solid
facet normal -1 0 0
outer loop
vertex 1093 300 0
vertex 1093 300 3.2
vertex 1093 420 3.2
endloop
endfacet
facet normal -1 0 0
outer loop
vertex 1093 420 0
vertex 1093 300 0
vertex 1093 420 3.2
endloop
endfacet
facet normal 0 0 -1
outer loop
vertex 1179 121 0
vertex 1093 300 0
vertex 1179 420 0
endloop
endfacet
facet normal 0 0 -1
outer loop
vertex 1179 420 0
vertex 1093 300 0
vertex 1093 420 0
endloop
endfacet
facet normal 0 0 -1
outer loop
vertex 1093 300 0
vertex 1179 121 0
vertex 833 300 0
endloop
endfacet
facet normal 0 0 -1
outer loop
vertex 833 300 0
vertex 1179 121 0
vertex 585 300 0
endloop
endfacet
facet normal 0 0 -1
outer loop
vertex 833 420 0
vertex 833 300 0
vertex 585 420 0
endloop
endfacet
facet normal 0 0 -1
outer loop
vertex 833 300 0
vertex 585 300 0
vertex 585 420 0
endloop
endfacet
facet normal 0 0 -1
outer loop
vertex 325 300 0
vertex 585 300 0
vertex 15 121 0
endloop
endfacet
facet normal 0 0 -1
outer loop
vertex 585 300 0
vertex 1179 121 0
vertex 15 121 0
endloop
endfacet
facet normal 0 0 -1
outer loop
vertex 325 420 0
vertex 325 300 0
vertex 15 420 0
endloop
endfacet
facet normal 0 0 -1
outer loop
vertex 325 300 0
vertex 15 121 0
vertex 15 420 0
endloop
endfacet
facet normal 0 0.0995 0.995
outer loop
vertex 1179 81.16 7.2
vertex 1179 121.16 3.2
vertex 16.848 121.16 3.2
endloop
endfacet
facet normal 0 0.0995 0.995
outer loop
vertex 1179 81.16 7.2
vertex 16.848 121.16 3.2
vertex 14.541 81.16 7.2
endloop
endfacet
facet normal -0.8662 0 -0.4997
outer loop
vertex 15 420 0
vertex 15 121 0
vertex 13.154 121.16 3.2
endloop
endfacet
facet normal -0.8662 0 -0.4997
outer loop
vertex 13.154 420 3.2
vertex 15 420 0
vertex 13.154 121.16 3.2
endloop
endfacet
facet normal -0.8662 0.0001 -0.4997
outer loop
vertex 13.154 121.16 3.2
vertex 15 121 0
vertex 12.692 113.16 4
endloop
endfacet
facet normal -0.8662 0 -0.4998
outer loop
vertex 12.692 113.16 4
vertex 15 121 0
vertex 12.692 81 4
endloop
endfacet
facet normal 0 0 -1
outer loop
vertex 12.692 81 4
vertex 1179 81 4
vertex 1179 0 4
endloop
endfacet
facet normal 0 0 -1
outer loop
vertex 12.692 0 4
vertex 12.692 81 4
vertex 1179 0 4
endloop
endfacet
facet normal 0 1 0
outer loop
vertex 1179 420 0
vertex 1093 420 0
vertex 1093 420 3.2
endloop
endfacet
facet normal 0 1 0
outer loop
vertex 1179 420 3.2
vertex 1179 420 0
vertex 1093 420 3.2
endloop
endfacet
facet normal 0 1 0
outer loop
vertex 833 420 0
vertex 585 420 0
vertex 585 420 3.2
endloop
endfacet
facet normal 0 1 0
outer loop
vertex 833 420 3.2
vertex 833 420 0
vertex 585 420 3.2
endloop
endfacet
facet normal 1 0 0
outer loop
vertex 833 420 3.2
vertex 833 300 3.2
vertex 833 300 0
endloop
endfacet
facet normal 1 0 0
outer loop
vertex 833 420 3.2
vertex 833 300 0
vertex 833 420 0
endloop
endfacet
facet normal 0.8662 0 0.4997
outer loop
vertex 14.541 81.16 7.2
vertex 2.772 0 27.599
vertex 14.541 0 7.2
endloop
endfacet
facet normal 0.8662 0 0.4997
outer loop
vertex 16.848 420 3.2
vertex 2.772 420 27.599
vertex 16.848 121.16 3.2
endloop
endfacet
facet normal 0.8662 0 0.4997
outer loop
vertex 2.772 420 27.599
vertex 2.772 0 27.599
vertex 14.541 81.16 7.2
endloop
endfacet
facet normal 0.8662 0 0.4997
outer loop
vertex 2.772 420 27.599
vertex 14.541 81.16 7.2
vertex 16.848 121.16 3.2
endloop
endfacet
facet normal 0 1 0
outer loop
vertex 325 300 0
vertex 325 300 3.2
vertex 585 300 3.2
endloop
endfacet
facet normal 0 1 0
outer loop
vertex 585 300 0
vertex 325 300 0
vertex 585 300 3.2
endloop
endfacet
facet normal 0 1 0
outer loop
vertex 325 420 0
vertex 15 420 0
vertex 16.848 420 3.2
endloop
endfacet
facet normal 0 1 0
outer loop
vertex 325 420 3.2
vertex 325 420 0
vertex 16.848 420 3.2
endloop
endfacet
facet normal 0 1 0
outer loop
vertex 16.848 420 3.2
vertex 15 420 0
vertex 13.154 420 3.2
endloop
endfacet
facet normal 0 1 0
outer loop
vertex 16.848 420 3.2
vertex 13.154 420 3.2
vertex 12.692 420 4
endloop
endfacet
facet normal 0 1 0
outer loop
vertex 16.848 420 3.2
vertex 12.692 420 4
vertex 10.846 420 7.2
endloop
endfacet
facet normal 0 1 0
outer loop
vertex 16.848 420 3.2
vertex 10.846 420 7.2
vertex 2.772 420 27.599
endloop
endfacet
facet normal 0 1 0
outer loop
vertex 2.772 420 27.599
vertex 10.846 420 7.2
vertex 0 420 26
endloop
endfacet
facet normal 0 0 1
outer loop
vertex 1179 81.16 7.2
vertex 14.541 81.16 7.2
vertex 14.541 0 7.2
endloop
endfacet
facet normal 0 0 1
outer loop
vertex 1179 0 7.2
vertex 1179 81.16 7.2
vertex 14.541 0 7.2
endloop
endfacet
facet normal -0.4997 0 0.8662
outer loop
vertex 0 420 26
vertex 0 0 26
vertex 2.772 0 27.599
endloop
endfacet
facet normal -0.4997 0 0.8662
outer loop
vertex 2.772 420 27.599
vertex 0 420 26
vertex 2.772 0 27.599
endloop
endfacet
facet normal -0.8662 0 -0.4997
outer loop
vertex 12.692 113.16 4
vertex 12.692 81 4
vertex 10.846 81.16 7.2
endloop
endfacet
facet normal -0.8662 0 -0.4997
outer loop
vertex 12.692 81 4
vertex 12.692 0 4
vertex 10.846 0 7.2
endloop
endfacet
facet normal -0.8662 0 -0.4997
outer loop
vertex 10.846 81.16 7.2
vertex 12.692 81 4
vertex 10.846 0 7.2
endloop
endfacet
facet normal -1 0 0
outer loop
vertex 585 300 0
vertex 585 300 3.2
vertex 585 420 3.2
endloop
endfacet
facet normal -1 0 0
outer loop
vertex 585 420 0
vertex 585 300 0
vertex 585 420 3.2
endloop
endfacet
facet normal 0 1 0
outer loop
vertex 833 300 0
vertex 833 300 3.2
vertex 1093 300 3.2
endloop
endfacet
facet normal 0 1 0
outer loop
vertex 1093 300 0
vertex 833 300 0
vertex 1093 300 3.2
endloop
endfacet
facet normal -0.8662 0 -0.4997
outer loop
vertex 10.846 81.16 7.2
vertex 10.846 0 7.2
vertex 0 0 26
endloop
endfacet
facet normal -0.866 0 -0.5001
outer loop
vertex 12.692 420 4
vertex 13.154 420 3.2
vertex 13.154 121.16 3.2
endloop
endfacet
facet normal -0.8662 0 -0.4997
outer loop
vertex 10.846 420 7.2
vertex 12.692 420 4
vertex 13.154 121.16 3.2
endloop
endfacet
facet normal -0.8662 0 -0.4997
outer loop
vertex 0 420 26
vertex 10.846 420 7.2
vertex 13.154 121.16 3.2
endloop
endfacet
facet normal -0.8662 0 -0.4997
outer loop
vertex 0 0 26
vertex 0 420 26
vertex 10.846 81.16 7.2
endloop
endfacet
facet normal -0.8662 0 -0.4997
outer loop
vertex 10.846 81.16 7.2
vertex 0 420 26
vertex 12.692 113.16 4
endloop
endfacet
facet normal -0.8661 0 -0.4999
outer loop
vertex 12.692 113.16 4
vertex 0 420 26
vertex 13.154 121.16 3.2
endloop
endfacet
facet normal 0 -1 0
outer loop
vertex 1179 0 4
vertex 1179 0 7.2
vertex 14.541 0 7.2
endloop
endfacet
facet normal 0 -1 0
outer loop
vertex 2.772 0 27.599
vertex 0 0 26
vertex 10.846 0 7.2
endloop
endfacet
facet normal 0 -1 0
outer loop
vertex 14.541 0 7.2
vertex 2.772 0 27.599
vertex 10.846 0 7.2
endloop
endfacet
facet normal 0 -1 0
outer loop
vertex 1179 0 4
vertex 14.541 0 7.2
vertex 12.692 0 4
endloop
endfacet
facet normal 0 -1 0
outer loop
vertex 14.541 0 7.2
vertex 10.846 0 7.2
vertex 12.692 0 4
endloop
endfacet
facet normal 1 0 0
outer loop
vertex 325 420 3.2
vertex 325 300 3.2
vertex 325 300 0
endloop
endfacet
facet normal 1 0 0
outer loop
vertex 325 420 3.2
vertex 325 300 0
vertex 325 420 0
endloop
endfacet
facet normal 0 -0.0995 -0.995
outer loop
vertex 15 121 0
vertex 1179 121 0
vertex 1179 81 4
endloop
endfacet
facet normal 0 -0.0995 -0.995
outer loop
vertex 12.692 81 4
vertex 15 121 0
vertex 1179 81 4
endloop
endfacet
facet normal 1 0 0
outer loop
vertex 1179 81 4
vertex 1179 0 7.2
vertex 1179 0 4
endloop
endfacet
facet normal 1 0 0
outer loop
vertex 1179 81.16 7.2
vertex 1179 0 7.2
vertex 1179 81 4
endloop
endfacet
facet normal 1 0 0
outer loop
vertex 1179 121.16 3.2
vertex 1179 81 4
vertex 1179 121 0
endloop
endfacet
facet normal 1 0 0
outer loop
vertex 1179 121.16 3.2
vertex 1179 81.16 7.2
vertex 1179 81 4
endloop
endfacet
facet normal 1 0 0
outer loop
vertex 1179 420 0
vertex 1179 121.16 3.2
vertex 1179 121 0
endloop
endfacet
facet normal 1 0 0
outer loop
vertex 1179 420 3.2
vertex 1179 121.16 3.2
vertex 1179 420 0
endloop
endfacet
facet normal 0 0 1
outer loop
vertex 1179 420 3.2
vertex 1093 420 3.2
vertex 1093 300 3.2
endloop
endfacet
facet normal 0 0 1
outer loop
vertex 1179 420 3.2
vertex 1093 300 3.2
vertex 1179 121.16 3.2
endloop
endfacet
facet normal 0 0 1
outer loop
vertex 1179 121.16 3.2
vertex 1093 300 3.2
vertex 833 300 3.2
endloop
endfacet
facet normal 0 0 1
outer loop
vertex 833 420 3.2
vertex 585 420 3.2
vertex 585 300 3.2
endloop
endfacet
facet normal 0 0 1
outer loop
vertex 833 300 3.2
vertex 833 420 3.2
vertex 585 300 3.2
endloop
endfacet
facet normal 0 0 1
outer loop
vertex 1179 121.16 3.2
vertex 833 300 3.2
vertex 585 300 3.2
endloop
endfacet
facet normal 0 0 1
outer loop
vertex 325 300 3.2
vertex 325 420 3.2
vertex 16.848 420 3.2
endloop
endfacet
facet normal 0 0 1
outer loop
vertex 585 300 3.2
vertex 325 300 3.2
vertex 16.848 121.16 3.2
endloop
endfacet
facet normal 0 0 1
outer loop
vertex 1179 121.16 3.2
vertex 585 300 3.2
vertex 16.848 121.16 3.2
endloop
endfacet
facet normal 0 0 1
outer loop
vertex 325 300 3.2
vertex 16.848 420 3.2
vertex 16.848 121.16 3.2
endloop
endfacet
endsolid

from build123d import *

# Parameters (mm, degrees)
F1_DEPTH = 1179
F2_W     = 260
F2_H     = 120
F3_DEPTH = 25
F5_DEPTH = 420
F7_DEPTH = 420
F9_DEPTH = 1200


with BuildPart() as f1:
    # F0 (on Right) → F1 (new body)
    with BuildSketch(Plane.YZ):
        Polygon((81, 4), (121, 0), (420, 0), (420, 3.2), (121.159602, 3.2), (81.159602, 7.2), (0, 7.2), (0, 4), align=None)
    extrude(amount=F1_DEPTH)

    # F2 (on face) → F3 (cut)
    with BuildSketch(Plane.XY.offset(3.2)):
        with Locations((455, 360)):
            Rectangle(F2_W, F2_H)
        with Locations((963, 360)):
            Rectangle(F2_W, F2_H)
    extrude(amount=-F3_DEPTH, mode=Mode.SUBTRACT)

    # F4 (on face) → F5 (join)
    with BuildSketch(Plane(origin=(0, 420, 0), x_dir=(-1, 0, 0), z_dir=(0, 1, 0))):
        Polygon((-17.771794, 1.599112), (-15, 0), (0, 26), (-2.771794, 27.599112), align=None)
    extrude(amount=-F5_DEPTH)

    # F6 (on face) → F7 (cut)
    with BuildSketch(Plane.XZ):
        Polygon((15, 0), (12.692308, 4), (0, 4), (0, 0), align=None)
        Polygon((12.692308, 4), (10.846154, 7.2), (0, 7.2), (0, 4), align=None)
    extrude(amount=-F7_DEPTH, mode=Mode.SUBTRACT)

    # F8 (on face) → F9 (cut)
    with BuildSketch(Plane.YZ.offset(1179)):
        Polygon((81, 4), (0, 4), (0, 0), (121, 0), align=None)
    extrude(amount=-F9_DEPTH, mode=Mode.SUBTRACT)


solid = f1.part
